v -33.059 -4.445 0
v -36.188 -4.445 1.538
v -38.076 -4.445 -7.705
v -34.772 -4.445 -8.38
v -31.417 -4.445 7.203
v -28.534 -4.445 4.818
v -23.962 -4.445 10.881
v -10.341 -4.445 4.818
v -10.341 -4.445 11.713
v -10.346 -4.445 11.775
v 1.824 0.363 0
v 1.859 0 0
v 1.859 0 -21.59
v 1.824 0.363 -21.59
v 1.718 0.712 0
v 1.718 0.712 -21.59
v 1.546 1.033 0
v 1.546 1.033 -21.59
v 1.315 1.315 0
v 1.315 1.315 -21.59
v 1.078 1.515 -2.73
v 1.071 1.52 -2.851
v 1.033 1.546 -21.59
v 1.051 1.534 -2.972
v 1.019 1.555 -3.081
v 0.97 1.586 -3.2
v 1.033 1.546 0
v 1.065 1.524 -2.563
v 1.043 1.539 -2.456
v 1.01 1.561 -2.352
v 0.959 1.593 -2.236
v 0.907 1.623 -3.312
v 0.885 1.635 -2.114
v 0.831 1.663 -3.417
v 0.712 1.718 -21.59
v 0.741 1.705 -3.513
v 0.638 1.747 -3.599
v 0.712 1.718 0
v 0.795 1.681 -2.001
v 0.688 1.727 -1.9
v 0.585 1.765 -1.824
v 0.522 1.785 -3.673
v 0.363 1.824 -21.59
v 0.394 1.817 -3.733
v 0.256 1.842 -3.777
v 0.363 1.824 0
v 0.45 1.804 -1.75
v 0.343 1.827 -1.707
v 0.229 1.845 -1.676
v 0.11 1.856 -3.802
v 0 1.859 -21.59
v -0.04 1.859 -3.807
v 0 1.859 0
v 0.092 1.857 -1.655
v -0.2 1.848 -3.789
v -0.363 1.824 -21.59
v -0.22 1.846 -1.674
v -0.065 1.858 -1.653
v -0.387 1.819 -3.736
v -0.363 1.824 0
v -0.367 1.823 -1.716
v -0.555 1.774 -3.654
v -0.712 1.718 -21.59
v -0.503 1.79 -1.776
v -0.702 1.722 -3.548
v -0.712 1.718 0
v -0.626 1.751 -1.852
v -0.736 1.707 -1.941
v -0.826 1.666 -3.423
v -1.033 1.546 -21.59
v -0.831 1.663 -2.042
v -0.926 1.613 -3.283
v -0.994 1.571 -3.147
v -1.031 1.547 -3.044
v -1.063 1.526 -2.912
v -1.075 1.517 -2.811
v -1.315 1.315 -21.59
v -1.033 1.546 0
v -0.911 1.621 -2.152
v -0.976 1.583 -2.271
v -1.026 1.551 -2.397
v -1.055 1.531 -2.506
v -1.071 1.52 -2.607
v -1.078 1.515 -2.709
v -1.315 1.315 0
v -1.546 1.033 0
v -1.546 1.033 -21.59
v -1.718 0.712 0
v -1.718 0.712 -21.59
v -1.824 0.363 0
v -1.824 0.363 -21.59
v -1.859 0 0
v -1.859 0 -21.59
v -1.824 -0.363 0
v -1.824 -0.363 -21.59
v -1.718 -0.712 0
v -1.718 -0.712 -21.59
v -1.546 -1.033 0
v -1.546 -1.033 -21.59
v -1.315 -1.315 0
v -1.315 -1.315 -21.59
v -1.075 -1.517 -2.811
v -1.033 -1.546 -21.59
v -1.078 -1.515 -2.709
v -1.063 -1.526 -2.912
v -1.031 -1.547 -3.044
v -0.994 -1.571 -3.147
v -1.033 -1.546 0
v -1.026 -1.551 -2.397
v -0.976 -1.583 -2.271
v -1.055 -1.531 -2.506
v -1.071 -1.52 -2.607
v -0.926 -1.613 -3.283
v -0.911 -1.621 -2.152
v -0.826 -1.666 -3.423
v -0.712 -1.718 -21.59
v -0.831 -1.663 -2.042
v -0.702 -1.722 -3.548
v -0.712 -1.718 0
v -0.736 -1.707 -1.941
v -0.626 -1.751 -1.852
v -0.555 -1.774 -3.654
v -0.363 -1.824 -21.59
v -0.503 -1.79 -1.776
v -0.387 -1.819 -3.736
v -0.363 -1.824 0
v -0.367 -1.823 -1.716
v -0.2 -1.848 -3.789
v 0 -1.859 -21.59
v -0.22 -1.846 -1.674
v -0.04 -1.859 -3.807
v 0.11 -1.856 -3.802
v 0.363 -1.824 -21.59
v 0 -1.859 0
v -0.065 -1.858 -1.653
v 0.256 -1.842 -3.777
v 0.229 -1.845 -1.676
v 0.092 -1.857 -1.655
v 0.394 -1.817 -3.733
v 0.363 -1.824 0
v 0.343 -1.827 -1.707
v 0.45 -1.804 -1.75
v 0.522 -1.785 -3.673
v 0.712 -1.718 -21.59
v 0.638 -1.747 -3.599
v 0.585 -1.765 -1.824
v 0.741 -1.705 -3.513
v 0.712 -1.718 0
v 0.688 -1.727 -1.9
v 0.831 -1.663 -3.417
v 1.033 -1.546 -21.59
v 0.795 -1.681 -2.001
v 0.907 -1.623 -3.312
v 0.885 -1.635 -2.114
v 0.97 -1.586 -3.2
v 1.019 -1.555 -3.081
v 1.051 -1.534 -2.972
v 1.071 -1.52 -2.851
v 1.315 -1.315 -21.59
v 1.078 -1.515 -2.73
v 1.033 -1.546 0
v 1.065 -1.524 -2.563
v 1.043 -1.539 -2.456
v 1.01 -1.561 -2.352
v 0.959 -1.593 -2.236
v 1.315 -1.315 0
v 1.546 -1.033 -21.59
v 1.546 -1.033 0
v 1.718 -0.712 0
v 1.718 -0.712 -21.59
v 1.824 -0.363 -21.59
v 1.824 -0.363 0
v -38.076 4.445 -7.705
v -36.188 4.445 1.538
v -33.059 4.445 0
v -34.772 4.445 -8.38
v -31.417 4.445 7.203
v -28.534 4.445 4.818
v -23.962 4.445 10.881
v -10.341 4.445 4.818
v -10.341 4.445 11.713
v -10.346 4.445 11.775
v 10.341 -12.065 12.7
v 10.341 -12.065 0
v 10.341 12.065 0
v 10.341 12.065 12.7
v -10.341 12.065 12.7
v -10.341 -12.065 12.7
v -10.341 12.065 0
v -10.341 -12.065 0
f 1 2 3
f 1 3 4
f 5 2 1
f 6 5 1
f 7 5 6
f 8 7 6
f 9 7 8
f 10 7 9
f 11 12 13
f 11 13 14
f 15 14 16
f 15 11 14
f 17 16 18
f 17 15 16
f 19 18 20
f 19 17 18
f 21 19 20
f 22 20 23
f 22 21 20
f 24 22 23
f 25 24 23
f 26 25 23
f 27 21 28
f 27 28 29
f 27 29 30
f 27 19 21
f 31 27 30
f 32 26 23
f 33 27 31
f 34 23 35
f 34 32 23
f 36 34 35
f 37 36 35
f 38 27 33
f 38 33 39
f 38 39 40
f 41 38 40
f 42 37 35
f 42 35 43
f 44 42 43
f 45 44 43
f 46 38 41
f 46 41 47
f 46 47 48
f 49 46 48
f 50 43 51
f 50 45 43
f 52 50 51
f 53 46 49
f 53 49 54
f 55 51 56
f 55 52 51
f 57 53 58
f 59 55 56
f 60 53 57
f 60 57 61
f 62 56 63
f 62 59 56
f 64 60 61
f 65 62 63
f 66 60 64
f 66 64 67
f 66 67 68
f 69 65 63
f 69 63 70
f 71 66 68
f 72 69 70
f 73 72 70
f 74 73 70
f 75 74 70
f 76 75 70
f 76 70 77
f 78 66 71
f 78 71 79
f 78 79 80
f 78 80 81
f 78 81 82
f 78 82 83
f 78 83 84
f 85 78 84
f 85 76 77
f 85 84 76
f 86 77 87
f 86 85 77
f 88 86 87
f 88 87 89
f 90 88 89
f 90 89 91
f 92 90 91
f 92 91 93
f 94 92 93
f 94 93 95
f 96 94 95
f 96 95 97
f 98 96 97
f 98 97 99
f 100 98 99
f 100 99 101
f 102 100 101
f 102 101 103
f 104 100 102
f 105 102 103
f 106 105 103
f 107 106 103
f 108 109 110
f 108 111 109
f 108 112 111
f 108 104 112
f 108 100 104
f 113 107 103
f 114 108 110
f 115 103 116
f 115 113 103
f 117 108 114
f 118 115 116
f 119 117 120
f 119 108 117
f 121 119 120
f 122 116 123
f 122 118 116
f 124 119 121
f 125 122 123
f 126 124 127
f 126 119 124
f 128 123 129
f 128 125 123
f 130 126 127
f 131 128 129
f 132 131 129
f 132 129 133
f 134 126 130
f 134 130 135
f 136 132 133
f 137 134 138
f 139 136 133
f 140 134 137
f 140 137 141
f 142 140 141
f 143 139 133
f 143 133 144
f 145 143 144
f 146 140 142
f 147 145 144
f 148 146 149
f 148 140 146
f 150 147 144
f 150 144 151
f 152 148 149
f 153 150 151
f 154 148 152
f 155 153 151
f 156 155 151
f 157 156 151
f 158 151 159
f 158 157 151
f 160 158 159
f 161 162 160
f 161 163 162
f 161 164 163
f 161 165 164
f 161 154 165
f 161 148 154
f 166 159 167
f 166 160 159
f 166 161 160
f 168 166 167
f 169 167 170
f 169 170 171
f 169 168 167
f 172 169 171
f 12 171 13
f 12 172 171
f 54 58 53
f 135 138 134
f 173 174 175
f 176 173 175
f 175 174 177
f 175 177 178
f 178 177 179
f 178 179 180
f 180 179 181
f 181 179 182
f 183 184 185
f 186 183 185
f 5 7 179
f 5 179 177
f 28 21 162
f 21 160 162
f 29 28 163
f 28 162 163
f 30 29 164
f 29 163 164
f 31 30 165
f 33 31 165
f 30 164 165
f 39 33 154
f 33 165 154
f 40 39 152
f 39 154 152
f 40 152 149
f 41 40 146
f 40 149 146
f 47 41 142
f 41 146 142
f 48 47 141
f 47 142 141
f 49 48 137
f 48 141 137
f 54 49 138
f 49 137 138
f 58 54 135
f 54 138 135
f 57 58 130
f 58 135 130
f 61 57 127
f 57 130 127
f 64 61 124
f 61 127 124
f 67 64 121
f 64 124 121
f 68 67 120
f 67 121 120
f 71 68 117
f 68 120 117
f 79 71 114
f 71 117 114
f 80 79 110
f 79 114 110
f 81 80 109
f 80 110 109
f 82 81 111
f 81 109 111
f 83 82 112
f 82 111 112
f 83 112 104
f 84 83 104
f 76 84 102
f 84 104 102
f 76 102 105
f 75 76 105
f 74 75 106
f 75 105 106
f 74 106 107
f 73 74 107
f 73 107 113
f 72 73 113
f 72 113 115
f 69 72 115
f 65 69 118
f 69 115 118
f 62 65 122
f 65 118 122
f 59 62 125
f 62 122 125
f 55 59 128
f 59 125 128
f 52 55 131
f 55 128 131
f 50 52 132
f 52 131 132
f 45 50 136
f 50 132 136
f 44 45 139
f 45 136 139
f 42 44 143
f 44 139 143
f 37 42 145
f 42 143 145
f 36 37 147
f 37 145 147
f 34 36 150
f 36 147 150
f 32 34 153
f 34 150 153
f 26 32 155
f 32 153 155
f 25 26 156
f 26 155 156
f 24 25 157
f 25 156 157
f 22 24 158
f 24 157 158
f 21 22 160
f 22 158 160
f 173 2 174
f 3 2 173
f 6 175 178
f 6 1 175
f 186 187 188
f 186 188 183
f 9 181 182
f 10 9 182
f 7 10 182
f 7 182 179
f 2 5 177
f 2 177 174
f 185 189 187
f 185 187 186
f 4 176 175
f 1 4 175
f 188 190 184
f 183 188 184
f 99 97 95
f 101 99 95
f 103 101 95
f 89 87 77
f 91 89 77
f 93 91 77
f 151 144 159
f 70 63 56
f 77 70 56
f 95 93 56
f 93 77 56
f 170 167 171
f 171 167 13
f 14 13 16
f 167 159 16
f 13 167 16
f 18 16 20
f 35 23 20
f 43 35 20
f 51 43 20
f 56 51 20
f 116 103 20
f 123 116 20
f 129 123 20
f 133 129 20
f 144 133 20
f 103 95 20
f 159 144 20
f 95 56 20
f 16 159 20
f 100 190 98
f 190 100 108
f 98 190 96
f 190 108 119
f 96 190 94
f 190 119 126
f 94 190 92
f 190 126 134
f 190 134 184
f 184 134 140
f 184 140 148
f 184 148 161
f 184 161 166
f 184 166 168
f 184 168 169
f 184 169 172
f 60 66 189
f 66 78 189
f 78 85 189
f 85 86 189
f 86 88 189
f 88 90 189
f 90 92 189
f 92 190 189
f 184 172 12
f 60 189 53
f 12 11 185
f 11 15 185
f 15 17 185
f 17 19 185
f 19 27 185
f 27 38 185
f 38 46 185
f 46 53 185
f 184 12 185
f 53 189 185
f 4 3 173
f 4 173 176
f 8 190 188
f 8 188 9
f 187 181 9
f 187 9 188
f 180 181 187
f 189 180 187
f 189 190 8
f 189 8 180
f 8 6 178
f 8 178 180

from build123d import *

# Parameters (mm, degrees)
F0_R     = 1.85928
F1_DEPTH = 21.59
F2_R     = 1.07823
F3_DEPTH = 3.175
F4_W     = 20.6828571429
F4_H     = 24.13
F5_DEPTH = 12.7
F7_DEPTH = 4.445


# Not quite as in the source:
# - a feature names something its author has since deleted; it is built from what else it names


with BuildPart() as f1:
    # F0 (on Top) → F1 (new body)
    with BuildSketch(Plane.XY):
        Circle(F0_R)
    extrude(amount=-F1_DEPTH)

    # F2 (on Front) → F3 (cut, symmetric)
    with BuildSketch(Plane.XZ):
        with Locations((0, -2.7295311447)):
            Circle(F2_R)
    extrude(amount=F3_DEPTH, both=True, mode=Mode.SUBTRACT)

    # F4 (on Top) → F5 (join)
    with BuildSketch(Plane.XY):
        Rectangle(F4_W, F4_H)
    extrude(amount=F5_DEPTH)

    # F6 (on Front) → F7 (join, symmetric)
    with BuildSketch(Plane.XZ):
        Polygon((-9.8489131778, 4.8180790618), (-10.3458696976, 11.7754703388), (-23.9624772221, 10.8809489757), (-31.4168259501, 7.2034704499), (-36.187607795, 1.5381660778), (-38.076043129, -7.7052260749), (-34.7716075912, -8.3803259436), (-33.0594976471, 0), (-28.5344794393, 4.8180790618), (-21.7758696526, 4.8180790618), align=None)
    extrude(amount=F7_DEPTH, both=True)


solid = f1.part
